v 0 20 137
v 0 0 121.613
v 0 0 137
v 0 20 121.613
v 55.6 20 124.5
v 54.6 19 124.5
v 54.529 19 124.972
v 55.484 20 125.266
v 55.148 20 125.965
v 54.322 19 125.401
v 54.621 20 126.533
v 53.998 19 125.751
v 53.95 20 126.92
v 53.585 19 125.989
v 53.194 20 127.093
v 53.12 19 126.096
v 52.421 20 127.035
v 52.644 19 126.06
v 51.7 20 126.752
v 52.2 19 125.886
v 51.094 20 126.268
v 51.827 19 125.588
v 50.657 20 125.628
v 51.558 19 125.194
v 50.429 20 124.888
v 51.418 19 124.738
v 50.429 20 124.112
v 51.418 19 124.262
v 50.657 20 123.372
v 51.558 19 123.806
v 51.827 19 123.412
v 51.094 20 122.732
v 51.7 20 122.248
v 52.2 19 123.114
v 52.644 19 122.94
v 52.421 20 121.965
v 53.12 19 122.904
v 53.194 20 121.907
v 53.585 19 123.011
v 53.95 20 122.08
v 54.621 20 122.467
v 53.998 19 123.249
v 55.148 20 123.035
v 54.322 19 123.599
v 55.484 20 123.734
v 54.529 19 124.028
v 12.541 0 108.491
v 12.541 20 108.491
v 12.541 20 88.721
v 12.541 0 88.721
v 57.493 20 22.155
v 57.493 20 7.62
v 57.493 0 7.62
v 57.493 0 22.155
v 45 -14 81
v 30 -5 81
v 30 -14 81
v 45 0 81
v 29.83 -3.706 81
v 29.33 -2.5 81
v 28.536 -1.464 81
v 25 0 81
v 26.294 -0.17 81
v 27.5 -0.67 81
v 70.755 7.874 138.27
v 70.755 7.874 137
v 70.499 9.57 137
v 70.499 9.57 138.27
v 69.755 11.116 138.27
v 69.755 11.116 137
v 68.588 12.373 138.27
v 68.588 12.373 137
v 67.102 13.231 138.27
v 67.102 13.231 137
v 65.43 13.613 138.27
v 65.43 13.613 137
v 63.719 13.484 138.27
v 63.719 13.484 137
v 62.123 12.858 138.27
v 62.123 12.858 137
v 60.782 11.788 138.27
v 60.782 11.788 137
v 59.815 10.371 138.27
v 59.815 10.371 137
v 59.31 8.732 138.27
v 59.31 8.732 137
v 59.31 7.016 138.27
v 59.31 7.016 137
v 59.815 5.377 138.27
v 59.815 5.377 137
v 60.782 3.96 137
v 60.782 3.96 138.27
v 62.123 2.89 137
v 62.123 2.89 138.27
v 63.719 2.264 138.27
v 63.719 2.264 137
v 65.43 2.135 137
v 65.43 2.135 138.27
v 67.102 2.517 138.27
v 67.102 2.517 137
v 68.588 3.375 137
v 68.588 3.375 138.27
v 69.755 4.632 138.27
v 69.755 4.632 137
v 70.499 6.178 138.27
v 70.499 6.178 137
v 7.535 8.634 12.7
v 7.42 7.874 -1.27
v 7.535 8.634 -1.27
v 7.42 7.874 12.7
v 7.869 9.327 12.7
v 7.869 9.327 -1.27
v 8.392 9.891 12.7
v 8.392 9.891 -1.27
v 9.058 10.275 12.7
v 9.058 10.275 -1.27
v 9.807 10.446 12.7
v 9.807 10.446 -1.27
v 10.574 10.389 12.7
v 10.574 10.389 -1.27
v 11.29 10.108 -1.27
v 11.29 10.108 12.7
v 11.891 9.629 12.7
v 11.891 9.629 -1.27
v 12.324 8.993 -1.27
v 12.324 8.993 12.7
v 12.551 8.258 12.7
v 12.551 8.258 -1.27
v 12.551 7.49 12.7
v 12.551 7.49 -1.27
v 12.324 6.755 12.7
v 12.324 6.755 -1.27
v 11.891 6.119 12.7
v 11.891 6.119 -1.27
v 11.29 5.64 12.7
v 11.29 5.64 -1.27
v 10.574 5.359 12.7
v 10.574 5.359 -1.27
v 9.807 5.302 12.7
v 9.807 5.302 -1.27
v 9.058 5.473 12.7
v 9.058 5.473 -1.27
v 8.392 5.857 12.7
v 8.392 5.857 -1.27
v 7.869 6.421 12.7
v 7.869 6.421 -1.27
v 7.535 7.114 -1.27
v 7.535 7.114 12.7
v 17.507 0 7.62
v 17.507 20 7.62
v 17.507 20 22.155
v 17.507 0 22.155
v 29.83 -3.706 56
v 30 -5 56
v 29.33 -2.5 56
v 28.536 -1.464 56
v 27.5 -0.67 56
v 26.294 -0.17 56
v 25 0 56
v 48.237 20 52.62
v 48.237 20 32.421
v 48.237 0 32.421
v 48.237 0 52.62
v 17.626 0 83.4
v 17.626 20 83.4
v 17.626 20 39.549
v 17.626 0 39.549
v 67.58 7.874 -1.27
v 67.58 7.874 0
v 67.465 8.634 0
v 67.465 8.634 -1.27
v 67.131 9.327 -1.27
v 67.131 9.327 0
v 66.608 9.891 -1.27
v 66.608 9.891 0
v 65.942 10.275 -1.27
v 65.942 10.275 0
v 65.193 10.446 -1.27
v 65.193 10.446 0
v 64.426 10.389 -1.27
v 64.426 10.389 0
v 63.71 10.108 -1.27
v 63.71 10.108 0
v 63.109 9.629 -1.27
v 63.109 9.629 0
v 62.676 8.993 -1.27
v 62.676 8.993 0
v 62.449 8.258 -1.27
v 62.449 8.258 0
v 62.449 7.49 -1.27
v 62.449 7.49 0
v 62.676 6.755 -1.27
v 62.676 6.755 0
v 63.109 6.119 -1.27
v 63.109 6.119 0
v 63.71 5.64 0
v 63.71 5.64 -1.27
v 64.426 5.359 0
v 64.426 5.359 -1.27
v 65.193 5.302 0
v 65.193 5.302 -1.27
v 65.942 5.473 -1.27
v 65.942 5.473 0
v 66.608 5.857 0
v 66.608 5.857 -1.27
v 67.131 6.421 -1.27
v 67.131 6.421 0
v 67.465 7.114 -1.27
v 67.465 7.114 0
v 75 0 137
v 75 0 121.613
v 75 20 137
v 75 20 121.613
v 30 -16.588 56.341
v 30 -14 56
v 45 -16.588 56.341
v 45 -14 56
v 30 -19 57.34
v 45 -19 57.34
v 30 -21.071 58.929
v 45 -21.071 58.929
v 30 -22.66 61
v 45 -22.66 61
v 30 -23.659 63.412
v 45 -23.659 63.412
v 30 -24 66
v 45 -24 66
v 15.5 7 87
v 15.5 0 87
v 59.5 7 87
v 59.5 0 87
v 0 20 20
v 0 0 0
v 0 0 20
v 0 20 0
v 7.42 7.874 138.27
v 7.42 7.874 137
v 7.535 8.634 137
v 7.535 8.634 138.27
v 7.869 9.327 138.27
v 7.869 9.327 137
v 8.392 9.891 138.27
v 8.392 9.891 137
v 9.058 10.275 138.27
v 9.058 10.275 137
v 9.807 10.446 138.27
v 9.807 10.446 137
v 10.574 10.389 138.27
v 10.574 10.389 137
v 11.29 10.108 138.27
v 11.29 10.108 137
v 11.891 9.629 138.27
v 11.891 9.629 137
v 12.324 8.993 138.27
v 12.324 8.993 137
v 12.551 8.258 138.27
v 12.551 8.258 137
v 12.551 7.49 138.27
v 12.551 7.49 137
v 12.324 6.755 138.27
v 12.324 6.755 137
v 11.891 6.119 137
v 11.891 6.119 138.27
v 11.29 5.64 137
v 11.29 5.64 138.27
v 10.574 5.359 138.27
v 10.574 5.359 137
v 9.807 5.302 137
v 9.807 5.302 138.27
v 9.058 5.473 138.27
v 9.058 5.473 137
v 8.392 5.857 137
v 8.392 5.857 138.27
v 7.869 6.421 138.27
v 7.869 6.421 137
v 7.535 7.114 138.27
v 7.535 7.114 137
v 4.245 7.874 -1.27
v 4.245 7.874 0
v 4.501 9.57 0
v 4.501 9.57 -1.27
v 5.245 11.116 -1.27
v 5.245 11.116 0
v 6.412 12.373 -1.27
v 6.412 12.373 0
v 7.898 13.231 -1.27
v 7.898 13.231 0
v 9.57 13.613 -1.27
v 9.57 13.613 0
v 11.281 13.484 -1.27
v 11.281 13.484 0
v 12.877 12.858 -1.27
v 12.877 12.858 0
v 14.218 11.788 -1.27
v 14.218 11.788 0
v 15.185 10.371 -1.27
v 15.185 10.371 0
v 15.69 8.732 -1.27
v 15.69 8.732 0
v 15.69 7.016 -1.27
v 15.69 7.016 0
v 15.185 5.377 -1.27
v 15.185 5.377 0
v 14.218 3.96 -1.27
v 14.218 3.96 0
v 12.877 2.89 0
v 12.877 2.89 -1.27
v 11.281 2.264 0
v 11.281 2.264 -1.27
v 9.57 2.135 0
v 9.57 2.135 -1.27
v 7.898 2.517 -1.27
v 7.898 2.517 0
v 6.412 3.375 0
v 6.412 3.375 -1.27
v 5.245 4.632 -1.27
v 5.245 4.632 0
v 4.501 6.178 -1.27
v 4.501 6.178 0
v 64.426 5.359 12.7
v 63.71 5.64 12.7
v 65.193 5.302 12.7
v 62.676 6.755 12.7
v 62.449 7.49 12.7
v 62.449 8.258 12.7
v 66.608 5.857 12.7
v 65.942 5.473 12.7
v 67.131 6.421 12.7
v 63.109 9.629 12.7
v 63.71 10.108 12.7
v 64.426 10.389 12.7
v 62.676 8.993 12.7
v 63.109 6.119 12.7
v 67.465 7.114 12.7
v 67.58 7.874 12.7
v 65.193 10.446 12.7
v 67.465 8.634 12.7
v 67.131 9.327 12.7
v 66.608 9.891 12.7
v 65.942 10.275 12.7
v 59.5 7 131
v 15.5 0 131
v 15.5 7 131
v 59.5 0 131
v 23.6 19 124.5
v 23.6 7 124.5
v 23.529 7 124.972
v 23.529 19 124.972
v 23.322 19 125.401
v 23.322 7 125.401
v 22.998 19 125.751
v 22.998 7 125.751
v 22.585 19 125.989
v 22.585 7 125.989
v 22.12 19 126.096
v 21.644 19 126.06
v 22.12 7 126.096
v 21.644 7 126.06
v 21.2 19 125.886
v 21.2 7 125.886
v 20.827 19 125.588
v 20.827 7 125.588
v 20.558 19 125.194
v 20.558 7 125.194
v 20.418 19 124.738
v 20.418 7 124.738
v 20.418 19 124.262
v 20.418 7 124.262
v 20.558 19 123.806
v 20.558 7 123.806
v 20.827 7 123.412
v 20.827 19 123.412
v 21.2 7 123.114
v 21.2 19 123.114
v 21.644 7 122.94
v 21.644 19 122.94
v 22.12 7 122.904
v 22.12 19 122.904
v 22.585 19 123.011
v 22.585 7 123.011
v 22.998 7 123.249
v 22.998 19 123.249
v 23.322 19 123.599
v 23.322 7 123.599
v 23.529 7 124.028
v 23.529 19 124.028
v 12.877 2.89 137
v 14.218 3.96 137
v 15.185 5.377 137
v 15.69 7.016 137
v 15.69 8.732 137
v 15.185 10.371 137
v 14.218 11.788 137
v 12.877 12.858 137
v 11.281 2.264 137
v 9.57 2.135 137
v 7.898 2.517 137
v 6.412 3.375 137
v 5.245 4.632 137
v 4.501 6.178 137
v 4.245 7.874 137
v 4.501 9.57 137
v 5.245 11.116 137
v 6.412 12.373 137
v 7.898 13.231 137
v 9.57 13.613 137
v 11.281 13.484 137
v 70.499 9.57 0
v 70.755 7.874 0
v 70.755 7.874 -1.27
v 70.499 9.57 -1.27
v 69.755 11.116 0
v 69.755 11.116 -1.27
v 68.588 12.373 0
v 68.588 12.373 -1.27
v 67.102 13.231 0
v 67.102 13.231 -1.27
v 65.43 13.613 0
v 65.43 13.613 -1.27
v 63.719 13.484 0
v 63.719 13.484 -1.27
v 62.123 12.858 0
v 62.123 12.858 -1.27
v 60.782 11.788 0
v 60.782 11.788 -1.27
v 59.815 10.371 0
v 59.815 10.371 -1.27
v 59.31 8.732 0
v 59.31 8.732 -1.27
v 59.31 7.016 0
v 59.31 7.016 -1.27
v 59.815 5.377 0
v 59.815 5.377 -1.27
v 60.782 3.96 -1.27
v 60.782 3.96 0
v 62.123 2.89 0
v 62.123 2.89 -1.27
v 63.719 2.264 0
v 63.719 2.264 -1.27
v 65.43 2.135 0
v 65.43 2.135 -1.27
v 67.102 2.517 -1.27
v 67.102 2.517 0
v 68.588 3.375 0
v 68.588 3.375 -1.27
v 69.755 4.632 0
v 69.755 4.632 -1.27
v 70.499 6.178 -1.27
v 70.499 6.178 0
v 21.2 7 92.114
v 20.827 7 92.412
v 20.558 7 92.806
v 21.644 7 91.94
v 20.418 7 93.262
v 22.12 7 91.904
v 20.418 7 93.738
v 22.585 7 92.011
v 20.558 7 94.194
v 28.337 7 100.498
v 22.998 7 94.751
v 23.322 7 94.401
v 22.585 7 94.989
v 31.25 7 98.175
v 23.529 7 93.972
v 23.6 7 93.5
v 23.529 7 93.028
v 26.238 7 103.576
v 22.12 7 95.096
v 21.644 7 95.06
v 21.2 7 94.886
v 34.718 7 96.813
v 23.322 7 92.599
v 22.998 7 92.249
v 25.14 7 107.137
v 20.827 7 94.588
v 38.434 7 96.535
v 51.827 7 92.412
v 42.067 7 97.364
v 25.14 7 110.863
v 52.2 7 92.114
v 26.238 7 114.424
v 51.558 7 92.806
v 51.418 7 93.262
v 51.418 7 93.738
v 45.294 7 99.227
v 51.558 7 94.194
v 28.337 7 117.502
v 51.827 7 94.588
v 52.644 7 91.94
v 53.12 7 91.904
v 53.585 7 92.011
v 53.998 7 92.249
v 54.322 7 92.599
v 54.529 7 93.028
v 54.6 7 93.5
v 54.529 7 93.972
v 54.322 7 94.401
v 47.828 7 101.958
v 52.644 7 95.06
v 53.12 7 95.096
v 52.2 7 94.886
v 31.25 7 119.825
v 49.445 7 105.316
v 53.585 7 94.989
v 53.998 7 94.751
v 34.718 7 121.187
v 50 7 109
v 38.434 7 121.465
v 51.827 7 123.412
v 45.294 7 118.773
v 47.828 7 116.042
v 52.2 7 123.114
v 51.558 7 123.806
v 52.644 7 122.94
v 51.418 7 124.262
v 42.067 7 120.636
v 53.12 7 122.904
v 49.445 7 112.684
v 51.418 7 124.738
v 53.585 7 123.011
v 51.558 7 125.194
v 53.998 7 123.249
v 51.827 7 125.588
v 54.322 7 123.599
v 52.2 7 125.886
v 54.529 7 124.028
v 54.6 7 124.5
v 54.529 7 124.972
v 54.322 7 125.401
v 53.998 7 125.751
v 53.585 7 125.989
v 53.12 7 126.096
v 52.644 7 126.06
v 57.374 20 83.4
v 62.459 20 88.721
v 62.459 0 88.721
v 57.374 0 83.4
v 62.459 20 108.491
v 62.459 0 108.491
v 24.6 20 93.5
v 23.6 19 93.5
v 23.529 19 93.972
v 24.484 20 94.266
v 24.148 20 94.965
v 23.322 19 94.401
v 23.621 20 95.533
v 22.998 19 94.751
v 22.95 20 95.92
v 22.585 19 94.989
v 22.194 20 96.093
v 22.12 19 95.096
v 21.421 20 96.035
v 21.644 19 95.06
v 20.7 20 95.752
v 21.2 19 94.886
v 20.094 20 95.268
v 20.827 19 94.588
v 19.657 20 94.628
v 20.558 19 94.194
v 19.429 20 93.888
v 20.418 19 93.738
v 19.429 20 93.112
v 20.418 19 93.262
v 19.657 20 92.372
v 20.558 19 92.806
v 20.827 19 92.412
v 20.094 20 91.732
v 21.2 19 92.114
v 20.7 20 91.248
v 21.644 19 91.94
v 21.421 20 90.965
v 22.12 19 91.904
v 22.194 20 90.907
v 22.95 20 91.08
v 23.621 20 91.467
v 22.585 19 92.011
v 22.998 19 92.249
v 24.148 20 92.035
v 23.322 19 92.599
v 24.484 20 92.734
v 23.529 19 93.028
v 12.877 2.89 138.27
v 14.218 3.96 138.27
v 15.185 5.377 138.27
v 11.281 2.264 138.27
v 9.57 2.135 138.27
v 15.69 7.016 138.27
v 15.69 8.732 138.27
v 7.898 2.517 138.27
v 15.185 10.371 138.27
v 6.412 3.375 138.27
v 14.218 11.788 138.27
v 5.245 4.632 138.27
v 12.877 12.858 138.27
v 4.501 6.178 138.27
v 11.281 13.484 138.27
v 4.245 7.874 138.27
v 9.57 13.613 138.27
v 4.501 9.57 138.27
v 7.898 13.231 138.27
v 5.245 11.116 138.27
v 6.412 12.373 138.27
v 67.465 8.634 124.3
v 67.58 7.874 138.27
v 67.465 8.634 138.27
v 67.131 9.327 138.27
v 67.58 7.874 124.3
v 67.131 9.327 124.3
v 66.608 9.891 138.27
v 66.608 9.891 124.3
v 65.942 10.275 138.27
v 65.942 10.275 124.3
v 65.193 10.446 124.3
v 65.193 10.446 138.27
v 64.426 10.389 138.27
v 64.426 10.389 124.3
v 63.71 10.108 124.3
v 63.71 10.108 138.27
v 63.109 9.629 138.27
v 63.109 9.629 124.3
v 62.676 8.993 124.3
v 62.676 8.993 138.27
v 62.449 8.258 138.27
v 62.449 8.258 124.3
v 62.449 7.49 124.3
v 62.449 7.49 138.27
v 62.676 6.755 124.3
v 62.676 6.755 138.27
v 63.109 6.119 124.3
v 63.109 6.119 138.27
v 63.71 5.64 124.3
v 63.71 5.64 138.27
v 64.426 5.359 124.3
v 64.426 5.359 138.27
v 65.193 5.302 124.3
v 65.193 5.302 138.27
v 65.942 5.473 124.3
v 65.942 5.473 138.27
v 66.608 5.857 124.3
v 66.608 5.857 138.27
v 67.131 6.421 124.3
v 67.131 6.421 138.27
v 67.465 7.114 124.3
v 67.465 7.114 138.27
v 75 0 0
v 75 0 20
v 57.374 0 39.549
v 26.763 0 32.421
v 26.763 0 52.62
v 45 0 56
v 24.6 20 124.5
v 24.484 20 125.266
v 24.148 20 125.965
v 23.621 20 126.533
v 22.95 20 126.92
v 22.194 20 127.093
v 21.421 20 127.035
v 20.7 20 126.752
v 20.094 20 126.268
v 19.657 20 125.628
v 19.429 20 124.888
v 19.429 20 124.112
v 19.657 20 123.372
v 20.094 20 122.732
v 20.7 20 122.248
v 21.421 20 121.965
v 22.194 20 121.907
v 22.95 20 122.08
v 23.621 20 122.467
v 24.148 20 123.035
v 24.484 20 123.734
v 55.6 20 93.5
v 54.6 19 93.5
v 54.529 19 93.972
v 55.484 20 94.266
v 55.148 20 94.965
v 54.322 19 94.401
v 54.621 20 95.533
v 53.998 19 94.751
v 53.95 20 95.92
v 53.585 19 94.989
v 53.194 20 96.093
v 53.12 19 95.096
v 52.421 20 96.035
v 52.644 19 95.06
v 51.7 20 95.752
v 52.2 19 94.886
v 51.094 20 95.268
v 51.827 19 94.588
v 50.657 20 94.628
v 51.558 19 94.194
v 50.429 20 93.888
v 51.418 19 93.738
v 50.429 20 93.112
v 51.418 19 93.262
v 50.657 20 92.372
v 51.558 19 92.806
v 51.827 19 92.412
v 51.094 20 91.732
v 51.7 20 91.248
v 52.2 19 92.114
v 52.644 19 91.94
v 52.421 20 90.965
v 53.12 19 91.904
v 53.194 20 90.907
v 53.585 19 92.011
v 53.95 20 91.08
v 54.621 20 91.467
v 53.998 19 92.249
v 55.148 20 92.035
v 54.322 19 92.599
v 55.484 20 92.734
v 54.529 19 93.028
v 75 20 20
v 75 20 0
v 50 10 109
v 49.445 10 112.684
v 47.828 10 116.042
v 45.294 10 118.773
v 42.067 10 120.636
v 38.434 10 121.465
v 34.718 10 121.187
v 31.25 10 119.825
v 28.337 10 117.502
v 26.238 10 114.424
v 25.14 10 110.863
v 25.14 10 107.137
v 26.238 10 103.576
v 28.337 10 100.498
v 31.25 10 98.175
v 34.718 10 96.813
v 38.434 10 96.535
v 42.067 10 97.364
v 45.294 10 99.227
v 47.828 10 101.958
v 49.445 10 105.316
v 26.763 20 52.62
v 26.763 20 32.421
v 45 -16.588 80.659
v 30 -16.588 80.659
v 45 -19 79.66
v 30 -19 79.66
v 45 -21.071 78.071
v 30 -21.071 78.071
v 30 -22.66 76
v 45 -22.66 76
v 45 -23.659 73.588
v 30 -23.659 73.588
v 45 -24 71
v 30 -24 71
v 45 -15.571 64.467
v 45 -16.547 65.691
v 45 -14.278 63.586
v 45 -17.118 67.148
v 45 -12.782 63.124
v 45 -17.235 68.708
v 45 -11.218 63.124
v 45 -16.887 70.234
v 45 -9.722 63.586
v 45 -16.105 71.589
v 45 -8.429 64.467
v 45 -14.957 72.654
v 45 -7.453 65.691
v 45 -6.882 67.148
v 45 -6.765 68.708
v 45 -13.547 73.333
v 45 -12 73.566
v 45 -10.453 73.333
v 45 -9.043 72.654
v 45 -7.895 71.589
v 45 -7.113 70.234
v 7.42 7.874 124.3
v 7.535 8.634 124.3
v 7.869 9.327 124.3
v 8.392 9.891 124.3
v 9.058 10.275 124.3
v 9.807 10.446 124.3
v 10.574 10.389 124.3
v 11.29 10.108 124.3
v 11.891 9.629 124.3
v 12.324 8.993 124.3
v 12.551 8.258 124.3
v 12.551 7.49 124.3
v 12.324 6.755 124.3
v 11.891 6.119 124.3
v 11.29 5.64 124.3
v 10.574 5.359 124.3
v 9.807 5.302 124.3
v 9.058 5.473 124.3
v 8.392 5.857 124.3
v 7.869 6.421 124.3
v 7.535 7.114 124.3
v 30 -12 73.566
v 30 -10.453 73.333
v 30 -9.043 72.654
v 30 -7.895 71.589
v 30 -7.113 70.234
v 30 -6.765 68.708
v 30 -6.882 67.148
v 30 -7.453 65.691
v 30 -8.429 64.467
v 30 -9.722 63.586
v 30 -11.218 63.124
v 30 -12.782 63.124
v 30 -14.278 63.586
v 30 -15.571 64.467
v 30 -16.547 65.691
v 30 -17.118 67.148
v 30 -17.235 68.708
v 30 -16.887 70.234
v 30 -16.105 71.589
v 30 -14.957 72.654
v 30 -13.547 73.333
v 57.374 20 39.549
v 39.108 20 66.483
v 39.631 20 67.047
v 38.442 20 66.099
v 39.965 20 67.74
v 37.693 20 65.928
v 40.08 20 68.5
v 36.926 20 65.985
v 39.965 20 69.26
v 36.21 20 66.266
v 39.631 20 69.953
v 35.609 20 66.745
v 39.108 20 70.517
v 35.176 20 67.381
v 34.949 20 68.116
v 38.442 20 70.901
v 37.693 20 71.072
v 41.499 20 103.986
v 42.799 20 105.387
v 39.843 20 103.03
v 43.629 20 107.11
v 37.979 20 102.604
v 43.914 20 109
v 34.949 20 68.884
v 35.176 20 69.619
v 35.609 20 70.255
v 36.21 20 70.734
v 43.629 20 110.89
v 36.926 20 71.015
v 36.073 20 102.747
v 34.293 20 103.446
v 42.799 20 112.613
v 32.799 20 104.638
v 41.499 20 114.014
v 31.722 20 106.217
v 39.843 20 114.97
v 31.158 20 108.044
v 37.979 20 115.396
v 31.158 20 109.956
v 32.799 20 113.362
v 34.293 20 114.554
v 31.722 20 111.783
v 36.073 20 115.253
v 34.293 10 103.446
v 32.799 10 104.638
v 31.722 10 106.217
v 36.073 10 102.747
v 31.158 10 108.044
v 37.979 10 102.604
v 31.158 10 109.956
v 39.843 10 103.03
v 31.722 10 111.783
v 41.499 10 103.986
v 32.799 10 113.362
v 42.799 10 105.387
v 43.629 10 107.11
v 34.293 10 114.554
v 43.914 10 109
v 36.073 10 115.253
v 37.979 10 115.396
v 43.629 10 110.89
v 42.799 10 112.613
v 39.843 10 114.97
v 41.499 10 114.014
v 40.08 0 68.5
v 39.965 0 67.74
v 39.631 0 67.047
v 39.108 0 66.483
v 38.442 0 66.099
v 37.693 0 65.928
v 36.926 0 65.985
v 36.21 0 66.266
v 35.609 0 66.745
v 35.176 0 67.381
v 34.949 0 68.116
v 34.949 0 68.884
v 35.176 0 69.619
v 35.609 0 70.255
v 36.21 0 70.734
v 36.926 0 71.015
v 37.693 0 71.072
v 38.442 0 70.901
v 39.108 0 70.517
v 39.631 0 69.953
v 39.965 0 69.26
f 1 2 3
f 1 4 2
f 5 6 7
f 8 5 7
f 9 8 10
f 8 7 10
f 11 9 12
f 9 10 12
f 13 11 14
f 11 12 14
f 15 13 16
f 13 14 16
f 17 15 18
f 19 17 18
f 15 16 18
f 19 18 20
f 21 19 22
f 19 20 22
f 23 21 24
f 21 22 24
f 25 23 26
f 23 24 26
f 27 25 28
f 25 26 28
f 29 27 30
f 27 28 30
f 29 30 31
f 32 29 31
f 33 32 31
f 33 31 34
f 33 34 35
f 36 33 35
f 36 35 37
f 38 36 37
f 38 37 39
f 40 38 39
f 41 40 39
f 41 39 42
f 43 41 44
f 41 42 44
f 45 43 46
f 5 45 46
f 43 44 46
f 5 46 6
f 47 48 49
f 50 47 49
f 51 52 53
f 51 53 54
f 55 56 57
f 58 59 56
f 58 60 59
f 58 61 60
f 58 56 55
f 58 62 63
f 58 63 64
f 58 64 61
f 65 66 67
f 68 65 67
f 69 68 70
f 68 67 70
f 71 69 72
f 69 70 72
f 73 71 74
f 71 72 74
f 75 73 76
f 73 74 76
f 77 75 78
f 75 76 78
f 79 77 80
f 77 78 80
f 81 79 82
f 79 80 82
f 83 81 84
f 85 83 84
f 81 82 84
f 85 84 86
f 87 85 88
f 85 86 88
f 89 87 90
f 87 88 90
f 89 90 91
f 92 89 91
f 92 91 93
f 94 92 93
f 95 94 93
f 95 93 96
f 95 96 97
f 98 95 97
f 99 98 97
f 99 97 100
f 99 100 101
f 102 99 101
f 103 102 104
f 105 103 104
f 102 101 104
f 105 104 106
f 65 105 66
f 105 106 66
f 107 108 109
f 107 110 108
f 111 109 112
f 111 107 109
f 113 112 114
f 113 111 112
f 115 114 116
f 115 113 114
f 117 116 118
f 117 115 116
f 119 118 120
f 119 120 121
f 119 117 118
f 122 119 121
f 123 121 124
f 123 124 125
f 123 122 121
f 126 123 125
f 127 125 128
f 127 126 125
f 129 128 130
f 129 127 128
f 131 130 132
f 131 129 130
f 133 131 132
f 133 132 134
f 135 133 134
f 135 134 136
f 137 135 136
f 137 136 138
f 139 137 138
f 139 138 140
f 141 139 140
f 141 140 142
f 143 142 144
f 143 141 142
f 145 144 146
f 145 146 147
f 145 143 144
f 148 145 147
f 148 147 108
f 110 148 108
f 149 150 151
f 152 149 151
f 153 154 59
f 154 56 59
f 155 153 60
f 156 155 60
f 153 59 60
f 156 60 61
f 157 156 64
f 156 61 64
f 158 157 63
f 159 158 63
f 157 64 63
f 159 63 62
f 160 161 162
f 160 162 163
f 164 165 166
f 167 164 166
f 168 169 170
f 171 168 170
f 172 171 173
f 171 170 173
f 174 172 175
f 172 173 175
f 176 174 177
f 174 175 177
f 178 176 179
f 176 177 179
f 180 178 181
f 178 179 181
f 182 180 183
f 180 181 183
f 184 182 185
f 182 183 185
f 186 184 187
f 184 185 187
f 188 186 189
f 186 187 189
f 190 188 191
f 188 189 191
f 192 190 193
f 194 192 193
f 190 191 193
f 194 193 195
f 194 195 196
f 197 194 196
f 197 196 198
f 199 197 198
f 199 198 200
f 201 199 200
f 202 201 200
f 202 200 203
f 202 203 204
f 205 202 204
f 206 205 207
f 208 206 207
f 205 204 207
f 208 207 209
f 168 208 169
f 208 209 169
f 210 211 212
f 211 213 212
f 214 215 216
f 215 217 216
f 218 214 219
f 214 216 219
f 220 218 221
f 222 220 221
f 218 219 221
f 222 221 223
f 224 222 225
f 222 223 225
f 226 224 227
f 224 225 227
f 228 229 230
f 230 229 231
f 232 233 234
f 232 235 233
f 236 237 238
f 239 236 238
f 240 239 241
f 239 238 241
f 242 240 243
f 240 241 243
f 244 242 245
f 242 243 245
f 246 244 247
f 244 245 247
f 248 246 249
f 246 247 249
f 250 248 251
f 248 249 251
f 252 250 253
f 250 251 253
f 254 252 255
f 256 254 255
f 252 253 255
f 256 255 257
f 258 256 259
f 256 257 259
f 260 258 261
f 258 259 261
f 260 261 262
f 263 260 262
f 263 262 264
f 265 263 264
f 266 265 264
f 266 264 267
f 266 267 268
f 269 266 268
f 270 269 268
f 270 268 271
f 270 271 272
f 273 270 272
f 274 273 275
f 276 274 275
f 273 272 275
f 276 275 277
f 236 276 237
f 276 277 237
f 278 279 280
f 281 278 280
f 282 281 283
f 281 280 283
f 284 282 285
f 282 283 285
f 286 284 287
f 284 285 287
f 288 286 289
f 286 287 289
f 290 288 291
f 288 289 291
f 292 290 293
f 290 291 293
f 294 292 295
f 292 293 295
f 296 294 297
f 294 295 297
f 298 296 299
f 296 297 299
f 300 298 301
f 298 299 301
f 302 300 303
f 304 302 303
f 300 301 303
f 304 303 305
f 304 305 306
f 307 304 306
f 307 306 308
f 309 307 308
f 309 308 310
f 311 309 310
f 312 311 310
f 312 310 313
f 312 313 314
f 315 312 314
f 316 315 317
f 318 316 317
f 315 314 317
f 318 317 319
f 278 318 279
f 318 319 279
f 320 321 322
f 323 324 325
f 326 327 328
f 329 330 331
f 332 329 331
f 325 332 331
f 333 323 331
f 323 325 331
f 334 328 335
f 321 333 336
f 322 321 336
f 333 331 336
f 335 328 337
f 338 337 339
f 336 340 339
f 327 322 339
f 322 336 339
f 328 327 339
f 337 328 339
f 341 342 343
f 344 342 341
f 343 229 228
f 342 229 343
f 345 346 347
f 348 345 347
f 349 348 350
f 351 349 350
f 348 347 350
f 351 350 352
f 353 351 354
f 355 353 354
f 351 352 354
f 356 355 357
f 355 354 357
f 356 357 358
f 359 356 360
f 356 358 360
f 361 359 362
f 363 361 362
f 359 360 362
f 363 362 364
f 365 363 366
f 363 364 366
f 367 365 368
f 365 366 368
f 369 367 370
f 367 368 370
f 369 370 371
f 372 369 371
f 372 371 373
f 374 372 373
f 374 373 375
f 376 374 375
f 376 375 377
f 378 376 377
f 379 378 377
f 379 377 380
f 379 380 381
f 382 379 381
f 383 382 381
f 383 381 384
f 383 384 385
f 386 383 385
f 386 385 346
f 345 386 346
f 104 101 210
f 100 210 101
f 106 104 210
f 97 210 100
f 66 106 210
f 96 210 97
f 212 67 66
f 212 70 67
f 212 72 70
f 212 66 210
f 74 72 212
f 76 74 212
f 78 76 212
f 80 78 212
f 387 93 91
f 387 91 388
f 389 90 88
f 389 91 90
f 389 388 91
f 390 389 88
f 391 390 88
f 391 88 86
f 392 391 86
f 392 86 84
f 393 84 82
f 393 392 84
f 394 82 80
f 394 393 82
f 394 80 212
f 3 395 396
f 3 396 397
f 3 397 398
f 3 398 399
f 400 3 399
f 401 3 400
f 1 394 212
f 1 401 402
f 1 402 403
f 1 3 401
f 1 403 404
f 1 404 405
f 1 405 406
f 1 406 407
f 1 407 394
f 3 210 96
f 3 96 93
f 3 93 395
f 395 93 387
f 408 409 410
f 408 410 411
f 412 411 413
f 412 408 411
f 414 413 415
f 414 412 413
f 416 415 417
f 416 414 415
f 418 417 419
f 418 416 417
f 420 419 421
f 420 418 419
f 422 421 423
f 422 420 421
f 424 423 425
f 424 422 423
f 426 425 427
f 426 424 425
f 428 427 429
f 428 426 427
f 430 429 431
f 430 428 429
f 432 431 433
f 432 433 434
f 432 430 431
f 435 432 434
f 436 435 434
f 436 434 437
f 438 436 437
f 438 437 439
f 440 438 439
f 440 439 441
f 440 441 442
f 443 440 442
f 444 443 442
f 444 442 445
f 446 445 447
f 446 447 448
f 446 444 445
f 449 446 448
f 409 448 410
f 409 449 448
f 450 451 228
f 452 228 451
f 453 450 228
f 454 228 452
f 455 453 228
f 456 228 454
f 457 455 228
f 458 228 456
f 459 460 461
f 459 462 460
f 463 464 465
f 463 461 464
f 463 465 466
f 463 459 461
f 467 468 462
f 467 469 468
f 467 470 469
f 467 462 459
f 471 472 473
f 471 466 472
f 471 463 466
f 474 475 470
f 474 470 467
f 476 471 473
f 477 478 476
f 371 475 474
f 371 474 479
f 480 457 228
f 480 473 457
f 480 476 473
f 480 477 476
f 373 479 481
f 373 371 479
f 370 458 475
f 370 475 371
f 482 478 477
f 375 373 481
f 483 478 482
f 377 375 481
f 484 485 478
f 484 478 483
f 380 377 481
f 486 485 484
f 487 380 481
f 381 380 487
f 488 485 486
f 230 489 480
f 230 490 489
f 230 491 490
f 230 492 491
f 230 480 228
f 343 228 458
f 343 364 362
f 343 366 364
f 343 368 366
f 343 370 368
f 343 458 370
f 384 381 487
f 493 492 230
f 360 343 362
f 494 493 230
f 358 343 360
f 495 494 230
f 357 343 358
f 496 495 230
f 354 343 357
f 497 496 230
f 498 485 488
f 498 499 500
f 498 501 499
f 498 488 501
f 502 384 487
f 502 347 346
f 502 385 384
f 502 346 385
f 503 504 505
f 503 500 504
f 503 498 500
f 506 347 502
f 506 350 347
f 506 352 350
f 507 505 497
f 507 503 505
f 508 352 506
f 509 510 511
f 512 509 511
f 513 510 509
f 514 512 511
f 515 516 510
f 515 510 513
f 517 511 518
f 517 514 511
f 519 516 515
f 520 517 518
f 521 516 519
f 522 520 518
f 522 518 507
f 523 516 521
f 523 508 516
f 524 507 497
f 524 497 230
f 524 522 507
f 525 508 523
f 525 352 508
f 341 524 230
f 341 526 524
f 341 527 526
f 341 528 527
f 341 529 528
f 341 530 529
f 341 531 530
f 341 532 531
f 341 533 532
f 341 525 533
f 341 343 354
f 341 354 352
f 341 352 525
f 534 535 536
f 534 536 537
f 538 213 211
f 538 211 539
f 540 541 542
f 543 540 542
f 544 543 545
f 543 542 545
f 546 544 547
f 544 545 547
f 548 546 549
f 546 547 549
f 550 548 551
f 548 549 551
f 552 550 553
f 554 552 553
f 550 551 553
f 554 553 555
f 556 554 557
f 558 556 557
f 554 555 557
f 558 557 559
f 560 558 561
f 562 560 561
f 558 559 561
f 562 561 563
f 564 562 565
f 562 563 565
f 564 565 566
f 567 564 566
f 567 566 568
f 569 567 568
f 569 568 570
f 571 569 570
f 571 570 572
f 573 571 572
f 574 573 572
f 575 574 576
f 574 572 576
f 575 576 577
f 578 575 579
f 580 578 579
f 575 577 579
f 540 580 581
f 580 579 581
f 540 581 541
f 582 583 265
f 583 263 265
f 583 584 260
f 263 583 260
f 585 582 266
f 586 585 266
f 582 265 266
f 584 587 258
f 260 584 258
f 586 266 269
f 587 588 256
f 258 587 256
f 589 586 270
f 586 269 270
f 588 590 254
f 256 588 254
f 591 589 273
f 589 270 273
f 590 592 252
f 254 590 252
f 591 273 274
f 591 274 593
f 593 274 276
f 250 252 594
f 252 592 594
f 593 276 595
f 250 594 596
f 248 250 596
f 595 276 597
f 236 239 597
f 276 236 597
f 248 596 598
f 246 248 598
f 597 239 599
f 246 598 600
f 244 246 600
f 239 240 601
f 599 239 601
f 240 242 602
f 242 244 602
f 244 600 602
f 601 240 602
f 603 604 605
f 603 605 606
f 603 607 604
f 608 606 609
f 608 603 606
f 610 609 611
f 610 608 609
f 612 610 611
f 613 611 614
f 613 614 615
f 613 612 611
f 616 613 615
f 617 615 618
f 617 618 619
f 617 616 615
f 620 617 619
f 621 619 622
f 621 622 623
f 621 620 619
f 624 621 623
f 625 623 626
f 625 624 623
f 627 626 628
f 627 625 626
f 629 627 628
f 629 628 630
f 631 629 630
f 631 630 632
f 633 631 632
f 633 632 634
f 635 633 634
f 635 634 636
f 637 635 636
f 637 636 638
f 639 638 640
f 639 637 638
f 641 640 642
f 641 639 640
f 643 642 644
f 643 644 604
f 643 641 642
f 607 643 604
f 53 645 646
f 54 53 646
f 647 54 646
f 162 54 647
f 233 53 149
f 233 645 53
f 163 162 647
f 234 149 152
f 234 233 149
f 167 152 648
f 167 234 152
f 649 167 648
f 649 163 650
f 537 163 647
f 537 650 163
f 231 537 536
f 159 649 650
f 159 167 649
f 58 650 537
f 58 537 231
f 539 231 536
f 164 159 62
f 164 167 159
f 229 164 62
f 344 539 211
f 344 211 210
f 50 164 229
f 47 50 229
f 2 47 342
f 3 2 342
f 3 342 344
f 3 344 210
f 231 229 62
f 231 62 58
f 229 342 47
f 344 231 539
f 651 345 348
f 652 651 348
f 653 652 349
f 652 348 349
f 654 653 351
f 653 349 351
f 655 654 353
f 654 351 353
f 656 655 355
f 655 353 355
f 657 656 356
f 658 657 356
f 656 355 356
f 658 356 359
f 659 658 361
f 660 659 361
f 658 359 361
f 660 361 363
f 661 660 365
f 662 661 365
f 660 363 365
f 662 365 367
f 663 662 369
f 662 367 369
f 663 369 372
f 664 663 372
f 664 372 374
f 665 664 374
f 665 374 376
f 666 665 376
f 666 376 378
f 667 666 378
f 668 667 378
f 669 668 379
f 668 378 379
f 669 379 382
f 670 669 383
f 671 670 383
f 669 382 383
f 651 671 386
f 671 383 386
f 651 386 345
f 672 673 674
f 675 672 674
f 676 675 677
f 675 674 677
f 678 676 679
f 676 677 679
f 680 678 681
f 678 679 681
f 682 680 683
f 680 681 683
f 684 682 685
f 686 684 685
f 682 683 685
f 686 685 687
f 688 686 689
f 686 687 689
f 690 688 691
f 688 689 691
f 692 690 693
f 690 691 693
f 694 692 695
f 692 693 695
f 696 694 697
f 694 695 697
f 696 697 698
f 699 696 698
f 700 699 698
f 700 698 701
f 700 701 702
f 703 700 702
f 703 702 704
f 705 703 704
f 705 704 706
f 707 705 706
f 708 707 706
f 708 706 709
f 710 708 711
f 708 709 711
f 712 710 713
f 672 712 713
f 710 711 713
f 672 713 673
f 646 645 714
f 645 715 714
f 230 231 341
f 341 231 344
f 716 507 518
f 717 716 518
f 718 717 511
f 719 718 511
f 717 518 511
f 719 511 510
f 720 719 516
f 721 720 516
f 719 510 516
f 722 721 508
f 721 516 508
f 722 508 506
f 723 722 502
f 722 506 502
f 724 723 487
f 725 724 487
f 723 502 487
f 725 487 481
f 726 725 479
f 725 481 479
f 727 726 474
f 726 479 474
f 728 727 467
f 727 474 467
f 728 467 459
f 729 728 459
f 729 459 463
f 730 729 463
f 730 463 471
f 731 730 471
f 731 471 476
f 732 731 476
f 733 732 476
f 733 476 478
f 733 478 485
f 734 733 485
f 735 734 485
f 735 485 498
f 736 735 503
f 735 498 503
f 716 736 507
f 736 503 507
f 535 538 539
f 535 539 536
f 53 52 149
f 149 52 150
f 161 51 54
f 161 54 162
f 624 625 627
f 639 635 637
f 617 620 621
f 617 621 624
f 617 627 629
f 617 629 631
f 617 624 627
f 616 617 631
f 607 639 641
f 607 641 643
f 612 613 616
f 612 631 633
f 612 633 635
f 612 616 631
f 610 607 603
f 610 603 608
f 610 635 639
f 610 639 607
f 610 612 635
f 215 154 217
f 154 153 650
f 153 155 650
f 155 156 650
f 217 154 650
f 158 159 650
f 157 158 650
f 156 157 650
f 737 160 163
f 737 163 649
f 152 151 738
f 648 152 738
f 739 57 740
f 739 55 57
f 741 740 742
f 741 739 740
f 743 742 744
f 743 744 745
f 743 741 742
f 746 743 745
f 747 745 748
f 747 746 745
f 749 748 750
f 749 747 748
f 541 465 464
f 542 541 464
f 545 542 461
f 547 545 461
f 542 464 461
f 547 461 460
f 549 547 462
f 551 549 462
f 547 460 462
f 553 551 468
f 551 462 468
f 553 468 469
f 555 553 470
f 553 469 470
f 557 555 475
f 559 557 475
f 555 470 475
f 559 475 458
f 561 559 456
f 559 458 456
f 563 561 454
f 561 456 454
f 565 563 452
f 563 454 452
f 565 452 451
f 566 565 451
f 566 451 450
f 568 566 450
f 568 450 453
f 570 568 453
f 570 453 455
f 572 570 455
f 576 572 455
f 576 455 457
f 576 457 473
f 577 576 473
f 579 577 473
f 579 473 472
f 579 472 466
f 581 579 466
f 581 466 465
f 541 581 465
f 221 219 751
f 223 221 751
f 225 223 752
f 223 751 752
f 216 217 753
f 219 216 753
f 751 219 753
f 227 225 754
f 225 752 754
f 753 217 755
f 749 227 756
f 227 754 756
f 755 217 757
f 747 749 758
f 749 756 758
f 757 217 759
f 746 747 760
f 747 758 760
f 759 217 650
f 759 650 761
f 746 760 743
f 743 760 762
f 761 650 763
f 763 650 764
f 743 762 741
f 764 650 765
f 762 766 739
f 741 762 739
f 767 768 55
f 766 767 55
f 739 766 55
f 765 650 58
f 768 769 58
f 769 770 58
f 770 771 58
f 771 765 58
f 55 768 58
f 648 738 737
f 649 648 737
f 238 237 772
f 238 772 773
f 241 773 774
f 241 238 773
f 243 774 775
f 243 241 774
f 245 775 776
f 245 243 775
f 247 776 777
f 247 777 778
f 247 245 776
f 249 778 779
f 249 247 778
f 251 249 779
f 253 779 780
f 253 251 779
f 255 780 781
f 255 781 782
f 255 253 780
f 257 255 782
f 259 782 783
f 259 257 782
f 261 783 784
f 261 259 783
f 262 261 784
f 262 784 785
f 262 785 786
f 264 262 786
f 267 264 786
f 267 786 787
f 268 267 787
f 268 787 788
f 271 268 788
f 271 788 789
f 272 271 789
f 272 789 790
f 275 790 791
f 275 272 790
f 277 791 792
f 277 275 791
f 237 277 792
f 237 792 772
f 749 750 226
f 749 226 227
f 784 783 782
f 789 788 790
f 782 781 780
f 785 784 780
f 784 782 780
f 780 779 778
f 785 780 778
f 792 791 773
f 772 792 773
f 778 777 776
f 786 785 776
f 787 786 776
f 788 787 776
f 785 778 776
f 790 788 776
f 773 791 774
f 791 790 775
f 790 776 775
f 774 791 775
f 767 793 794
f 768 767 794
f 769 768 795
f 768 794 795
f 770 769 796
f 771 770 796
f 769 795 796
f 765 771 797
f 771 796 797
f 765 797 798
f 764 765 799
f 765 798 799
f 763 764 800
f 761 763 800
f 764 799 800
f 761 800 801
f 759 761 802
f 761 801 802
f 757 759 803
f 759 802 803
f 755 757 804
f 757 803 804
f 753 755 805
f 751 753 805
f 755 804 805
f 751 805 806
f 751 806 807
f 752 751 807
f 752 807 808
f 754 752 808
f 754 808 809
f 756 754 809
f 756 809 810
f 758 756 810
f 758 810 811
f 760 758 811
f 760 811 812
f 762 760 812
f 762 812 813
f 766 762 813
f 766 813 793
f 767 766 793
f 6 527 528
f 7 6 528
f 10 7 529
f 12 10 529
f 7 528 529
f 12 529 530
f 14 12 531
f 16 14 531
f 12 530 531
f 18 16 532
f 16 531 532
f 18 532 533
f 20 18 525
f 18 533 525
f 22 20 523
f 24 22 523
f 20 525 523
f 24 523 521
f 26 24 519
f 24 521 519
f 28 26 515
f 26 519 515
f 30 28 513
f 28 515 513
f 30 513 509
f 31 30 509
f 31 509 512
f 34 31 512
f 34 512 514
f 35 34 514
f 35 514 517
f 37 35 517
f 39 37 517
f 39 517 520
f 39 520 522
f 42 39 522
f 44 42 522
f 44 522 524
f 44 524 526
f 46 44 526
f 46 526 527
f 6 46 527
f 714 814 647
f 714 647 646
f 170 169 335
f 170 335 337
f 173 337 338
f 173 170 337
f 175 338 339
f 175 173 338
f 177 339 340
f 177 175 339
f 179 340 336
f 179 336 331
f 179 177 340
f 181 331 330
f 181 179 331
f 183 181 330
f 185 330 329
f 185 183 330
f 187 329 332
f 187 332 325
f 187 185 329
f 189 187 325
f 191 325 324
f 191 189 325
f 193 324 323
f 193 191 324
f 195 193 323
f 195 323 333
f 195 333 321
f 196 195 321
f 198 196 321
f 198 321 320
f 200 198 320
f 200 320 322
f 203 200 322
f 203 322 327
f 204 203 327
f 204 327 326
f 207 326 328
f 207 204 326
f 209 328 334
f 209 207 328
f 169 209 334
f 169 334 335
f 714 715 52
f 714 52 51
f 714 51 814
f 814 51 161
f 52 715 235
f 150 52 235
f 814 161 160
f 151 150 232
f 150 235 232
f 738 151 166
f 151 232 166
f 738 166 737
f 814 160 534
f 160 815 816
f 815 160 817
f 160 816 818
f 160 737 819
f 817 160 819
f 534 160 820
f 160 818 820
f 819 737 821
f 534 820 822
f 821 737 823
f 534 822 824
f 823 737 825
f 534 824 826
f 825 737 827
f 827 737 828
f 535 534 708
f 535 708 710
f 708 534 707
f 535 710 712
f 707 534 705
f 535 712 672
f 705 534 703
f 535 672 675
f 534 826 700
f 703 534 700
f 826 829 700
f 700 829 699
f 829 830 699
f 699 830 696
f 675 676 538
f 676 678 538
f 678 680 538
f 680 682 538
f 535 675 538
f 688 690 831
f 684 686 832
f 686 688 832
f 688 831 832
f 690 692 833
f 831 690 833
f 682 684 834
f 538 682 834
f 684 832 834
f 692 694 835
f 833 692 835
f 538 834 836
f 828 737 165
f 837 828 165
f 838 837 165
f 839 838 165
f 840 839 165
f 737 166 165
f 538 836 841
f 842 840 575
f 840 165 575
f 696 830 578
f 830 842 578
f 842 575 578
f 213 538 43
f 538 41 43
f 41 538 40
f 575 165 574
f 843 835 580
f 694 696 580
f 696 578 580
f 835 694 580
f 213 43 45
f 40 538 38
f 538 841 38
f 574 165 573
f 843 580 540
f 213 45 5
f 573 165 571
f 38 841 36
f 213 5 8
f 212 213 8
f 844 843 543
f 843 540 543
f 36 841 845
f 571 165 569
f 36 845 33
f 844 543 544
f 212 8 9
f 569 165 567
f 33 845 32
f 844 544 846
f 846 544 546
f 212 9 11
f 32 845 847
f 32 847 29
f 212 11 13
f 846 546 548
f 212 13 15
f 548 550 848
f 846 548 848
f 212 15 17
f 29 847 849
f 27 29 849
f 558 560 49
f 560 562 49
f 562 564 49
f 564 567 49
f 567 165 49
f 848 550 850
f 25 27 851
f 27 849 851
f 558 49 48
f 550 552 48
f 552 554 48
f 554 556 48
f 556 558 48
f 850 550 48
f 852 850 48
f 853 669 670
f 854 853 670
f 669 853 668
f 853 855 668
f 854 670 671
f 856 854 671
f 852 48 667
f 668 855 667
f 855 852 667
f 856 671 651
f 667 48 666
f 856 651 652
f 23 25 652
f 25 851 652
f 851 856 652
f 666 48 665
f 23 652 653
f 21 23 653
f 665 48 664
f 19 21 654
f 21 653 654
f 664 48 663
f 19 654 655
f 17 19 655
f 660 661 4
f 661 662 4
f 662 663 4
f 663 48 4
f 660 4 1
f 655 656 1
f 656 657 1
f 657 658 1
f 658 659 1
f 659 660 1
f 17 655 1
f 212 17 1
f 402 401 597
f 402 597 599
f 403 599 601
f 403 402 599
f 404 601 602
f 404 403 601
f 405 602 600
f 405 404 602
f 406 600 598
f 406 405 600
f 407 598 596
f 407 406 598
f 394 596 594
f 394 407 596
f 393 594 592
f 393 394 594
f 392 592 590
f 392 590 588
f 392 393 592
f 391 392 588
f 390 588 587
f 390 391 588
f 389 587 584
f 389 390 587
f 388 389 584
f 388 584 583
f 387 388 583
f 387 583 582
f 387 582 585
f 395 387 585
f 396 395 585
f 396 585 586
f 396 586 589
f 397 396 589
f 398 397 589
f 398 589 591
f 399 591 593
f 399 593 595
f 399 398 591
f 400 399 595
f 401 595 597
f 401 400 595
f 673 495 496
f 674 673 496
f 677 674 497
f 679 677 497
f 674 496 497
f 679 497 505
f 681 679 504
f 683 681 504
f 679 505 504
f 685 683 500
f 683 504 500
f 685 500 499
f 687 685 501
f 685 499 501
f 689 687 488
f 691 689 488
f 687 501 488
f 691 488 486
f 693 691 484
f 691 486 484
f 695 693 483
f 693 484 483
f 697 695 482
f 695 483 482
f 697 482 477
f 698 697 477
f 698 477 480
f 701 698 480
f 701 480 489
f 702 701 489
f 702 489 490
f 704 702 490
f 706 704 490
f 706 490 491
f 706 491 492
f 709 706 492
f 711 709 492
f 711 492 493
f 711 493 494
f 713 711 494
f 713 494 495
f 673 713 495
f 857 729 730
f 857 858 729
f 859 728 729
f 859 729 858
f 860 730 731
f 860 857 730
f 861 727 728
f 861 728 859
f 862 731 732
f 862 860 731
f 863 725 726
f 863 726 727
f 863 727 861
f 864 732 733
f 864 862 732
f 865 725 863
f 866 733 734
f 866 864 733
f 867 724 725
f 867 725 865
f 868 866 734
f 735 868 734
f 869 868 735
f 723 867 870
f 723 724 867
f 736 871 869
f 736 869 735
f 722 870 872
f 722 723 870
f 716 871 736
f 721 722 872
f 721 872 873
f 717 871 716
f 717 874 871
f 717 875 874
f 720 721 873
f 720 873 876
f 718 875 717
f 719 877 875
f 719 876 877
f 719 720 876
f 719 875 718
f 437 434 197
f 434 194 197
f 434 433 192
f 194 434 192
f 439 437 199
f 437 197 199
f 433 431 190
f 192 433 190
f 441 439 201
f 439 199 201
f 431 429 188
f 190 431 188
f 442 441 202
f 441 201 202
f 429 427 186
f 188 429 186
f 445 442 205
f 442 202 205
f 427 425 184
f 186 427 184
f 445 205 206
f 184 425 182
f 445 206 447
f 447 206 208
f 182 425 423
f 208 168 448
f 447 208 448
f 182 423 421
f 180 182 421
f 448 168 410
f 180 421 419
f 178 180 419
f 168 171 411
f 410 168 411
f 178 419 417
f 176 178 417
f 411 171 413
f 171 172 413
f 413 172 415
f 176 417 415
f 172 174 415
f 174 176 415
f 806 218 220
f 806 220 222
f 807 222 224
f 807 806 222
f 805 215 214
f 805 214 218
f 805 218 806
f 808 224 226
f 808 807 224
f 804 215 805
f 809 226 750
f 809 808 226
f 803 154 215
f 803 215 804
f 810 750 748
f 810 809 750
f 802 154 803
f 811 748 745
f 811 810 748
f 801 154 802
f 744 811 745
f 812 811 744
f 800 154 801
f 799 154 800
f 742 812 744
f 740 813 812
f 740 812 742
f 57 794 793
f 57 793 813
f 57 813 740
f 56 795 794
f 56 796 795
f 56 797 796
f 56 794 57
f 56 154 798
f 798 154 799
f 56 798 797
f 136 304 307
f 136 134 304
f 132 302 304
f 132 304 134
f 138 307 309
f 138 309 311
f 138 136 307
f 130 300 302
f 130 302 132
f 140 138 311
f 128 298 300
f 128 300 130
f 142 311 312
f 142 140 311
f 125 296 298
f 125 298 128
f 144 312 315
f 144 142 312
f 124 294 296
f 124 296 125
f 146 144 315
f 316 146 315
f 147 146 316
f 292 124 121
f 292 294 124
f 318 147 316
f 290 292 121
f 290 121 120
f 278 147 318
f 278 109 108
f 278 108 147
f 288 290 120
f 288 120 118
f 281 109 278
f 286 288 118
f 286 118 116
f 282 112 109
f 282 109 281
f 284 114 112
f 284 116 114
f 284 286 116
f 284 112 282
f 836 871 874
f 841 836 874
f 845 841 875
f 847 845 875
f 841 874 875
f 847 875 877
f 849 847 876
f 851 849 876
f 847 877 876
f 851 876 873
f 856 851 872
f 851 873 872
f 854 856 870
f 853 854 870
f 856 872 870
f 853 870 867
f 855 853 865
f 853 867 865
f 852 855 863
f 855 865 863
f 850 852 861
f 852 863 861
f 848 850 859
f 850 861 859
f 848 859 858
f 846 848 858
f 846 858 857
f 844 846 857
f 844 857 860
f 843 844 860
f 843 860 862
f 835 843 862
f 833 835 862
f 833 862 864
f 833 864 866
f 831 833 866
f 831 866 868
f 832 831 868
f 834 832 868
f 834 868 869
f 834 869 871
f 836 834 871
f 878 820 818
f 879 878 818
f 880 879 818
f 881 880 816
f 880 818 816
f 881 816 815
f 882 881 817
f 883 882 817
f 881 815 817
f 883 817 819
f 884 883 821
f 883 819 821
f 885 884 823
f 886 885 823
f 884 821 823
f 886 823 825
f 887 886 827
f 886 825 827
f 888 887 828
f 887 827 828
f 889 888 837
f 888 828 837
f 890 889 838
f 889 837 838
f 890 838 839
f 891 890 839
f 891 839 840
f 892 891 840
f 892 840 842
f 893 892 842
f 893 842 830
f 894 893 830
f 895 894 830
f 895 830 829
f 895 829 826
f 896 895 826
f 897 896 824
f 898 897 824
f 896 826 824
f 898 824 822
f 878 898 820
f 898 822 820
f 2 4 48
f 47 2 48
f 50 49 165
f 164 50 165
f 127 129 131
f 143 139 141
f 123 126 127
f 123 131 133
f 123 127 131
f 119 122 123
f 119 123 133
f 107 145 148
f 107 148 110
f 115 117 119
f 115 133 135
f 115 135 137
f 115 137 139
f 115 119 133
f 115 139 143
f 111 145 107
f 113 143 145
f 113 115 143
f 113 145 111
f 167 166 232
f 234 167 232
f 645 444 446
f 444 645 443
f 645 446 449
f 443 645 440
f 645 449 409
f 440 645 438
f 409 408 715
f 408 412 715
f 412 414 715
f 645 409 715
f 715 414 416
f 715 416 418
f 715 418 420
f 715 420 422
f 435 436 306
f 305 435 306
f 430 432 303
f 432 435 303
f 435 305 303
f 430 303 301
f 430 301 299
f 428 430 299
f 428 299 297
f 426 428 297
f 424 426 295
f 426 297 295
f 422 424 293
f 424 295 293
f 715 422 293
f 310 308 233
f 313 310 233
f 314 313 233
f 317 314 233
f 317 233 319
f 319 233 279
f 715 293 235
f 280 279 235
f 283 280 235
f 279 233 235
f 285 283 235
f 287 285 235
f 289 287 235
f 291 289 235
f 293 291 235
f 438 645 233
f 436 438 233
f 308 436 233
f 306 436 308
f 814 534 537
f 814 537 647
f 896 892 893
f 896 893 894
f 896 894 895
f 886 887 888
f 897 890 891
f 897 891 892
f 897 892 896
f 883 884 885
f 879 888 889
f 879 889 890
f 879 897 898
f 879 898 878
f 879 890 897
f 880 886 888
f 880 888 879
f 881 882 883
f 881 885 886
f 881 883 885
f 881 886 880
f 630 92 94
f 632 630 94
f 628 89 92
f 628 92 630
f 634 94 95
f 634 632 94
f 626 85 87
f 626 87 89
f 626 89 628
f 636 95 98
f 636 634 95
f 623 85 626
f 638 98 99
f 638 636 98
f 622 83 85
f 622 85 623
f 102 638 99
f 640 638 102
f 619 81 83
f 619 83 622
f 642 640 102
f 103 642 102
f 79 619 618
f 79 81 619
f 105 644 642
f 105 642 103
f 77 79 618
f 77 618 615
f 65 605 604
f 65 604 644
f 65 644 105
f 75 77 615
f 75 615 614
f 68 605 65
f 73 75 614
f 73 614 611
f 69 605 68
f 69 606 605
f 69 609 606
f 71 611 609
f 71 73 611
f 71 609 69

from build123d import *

# Parameters (mm, degrees)
SKETCH1_W                 = 68.5
SKETCH1_H                 = 20
BOSS_EXTRUDE1_DEPTH       = 75
SKETCH5_W                 = 15
SKETCH5_H                 = 25
BOSS_EXTRUDE2_DEPTH       = 24
SKETCH6_R                 = 5.25
CUT_EXTRUDE4_DEPTH        = 147.184814533
SKETCH2_W                 = 44
SKETCH2_H                 = 44
CUT_EXTRUDE1_DEPTH        = 7
SKETCH3_R                 = 6.4135
SKETCH3_R_2               = 1.6
CUT_EXTRUDE2_DEPTH        = 160.232534364
SKETCH4_R                 = 12.5
CUT_EXTRUDE3_DEPTH        = 3
CHAMFER1_SIZE             = 1
FILLET1_R                 = 10
FILLET2_R                 = 5
SKETCH16_R                = 2.5796875
CUT_EXTRUDE6_DEPTH        = 20
SKETCH7_R                 = 2.5796875
CUT_EXTRUDE7_DEPTH        = 12.7
BOSS_EXTRUDE3_START       = 1.27
SKETCH7_3_R               = 5.7546875
SKETCH7_3_R_2             = 2.5796875
BOSS_EXTRUDE3_DEPTH       = 1.27
MIRROR3_COPY_1_SKETCH_R   = 2.5796875
MIRROR3_COPY_1_DEPTH      = 12.7
MIRROR3_START             = 1.27
MIRROR3_COPY_2_SKETCH_R   = 5.7546875
MIRROR3_COPY_2_SKETCH_R_2 = 2.5796875
MIRROR3_COPY_2_DEPTH      = 1.27
CUT_EXTRUDE8_DEPTH        = 164.338889735


with BuildPart() as part:
    # Sketch1 → Boss-Extrude1 (new body)
    with BuildSketch(Plane(origin=(0, 0, 0), x_dir=(0, 0, -1), z_dir=(1, 0, 0))):
        with Locations((-34.25, 10)):
            Rectangle(SKETCH1_W, SKETCH1_H)
    boss_extrude1 = extrude(amount=BOSS_EXTRUDE1_DEPTH)

    # Mirror1: Boss-Extrude1 across plane
    add(boss_extrude1.mirror(Plane(origin=(75, 0, 68.5), x_dir=(1, 0, 0), z_dir=(0, 0, -1))))

    # Sketch5 → Boss-Extrude2 (add)
    with BuildSketch(Plane.XZ):
        with Locations((37.5, 68.5)):
            Rectangle(SKETCH5_W, SKETCH5_H)
    extrude(amount=BOSS_EXTRUDE2_DEPTH)

    # Sketch6 → Cut-Extrude4 (cut, through all)
    with BuildSketch(Plane.ZY.offset(-30)):
        with Locations((68.315835428, -12)):
            Circle(SKETCH6_R)
    extrude(amount=-CUT_EXTRUDE4_DEPTH, mode=Mode.SUBTRACT)

    # Sketch2 → Cut-Extrude1 (cut)
    with BuildSketch(Plane.XZ):
        with Locations((37.5, 109)):
            Rectangle(SKETCH2_W, SKETCH2_H)
    extrude(amount=-CUT_EXTRUDE1_DEPTH, mode=Mode.SUBTRACT)

    # Sketch3 → Cut-Extrude2 (cut, through all)
    with BuildSketch(Plane.XZ.offset(-7)):
        with Locations((37.5, 109)):
            Circle(SKETCH3_R)
        with Locations((22, 93.5)):
            Circle(SKETCH3_R_2)
        with Locations((22, 124.5)):
            Circle(SKETCH3_R_2)
        with Locations((53, 124.5)):
            Circle(SKETCH3_R_2)
        with Locations((53, 93.5)):
            Circle(SKETCH3_R_2)
    extrude(amount=-CUT_EXTRUDE2_DEPTH, mode=Mode.SUBTRACT)

    # Sketch4 → Cut-Extrude3 (cut)
    with BuildSketch(Plane.XZ.offset(-7)):
        with Locations((37.5, 109)):
            Circle(SKETCH4_R)
    extrude(amount=-CUT_EXTRUDE3_DEPTH, mode=Mode.SUBTRACT)

    # Chamfer1
    chamfer1_edges = [part.edges().sort_by_distance(p)[0] for p in [
        (20.4, 20, 124.5),
        (51.4, 20, 124.5),
        (51.4, 20, 93.5),
        (20.4, 20, 93.5),
    ]]
    chamfer(chamfer1_edges, length=CHAMFER1_SIZE)

    # Fillet1
    fillet1_edges = [part.edges().sort_by_distance(p)[0] for p in [
        (37.5, -24, 56),
        (37.5, -24, 81),
    ]]
    fillet(fillet1_edges, radius=FILLET1_R)

    # Fillet2
    fillet2_edges = [part.edges().sort_by_distance(p)[0] for p in [
        (30, 0, 68.5),
    ]]
    fillet(fillet2_edges, radius=FILLET2_R)

    # Sketch16 → Cut-Extrude6 (cut)
    with BuildSketch(Plane(origin=(0, 20, 0), x_dir=(1, 0, 0), z_dir=(0, 1, 0))):
        with Locations((37.5, -68.5)):
            Circle(SKETCH16_R)
    extrude(amount=-CUT_EXTRUDE6_DEPTH, mode=Mode.SUBTRACT)

    # Sketch7 → Cut-Extrude7 (cut)
    with BuildSketch(Plane(origin=(0, 0, 0), x_dir=(-1, 0, 0), z_dir=(0, 0, -1))):
        with Locations((-10, 7.874)):
            Circle(SKETCH7_R)
    cut_extrude7 = extrude(amount=-CUT_EXTRUDE7_DEPTH, mode=Mode.SUBTRACT)

    # Sketch7<3> → Boss-Extrude3 (add)
    with BuildSketch(Plane(origin=(0, 0, 0), x_dir=(-1, 0, 0), z_dir=(0, 0, -1)).offset(BOSS_EXTRUDE3_START)):
        with Locations((-10, 7.874)):
            Circle(SKETCH7_3_R)
        with Locations((-10, 7.874)):
            Circle(SKETCH7_3_R_2, mode=Mode.SUBTRACT)
    boss_extrude3 = extrude(amount=-BOSS_EXTRUDE3_DEPTH)

    # Mirror2: Cut-Extrude7, Boss-Extrude3 across plane
    add(cut_extrude7.mirror(Plane.ZY.offset(-37.5)), mode=Mode.SUBTRACT)
    add(boss_extrude3.mirror(Plane.ZY.offset(-37.5)))

    # Mirror3: Cut-Extrude7, Boss-Extrude3 across plane
    add(cut_extrude7.mirror(Plane.XY.offset(68.5)), mode=Mode.SUBTRACT)
    add(boss_extrude3.mirror(Plane.XY.offset(68.5)))

    # Mirror3 copy 1 sketch → Mirror3 copy 1 (cut)
    with BuildSketch(Plane(origin=(75, 0, 137), x_dir=(1, 0, 0), z_dir=(0, 0, 1))):
        with Locations((-10, 7.874)):
            Circle(MIRROR3_COPY_1_SKETCH_R)
    extrude(amount=-MIRROR3_COPY_1_DEPTH, mode=Mode.SUBTRACT)

    # Mirror3 copy 2 sketch → Mirror3 copy 2 (add)
    with BuildSketch(Plane(origin=(75, 0, 137), x_dir=(1, 0, 0), z_dir=(0, 0, 1)).offset(MIRROR3_START)):
        with Locations((-10, 7.874)):
            Circle(MIRROR3_COPY_2_SKETCH_R)
        with Locations((-10, 7.874)):
            Circle(MIRROR3_COPY_2_SKETCH_R_2, mode=Mode.SUBTRACT)
    extrude(amount=-MIRROR3_COPY_2_DEPTH)

    # Sketch18 → Cut-Extrude8 (cut, through all)
    with BuildSketch(Plane(origin=(0, 20, 0), x_dir=(1, 0, 0), z_dir=(0, 1, 0))):
        Polygon((62.458777686, -88.720593409), (57.373918935, -83.400245236), (57.373918935, -39.549393127), (75, -20), (75, -121.613031971), (62.458777686, -108.491001941), align=None)
        Polygon((48.237394794, -32.421103895), (48.237394794, -52.62), (37.493383725, -52.62), (37.493383725, -7.62), (57.493383725, -7.62), (57.493383725, -22.155125557), align=None)
    cut_extrude8 = extrude(amount=-CUT_EXTRUDE8_DEPTH, mode=Mode.SUBTRACT)

    # Mirror4: Cut-Extrude8 across plane
    add(cut_extrude8.mirror(Plane.ZY.offset(-37.5)), mode=Mode.SUBTRACT)


solid = part.part
